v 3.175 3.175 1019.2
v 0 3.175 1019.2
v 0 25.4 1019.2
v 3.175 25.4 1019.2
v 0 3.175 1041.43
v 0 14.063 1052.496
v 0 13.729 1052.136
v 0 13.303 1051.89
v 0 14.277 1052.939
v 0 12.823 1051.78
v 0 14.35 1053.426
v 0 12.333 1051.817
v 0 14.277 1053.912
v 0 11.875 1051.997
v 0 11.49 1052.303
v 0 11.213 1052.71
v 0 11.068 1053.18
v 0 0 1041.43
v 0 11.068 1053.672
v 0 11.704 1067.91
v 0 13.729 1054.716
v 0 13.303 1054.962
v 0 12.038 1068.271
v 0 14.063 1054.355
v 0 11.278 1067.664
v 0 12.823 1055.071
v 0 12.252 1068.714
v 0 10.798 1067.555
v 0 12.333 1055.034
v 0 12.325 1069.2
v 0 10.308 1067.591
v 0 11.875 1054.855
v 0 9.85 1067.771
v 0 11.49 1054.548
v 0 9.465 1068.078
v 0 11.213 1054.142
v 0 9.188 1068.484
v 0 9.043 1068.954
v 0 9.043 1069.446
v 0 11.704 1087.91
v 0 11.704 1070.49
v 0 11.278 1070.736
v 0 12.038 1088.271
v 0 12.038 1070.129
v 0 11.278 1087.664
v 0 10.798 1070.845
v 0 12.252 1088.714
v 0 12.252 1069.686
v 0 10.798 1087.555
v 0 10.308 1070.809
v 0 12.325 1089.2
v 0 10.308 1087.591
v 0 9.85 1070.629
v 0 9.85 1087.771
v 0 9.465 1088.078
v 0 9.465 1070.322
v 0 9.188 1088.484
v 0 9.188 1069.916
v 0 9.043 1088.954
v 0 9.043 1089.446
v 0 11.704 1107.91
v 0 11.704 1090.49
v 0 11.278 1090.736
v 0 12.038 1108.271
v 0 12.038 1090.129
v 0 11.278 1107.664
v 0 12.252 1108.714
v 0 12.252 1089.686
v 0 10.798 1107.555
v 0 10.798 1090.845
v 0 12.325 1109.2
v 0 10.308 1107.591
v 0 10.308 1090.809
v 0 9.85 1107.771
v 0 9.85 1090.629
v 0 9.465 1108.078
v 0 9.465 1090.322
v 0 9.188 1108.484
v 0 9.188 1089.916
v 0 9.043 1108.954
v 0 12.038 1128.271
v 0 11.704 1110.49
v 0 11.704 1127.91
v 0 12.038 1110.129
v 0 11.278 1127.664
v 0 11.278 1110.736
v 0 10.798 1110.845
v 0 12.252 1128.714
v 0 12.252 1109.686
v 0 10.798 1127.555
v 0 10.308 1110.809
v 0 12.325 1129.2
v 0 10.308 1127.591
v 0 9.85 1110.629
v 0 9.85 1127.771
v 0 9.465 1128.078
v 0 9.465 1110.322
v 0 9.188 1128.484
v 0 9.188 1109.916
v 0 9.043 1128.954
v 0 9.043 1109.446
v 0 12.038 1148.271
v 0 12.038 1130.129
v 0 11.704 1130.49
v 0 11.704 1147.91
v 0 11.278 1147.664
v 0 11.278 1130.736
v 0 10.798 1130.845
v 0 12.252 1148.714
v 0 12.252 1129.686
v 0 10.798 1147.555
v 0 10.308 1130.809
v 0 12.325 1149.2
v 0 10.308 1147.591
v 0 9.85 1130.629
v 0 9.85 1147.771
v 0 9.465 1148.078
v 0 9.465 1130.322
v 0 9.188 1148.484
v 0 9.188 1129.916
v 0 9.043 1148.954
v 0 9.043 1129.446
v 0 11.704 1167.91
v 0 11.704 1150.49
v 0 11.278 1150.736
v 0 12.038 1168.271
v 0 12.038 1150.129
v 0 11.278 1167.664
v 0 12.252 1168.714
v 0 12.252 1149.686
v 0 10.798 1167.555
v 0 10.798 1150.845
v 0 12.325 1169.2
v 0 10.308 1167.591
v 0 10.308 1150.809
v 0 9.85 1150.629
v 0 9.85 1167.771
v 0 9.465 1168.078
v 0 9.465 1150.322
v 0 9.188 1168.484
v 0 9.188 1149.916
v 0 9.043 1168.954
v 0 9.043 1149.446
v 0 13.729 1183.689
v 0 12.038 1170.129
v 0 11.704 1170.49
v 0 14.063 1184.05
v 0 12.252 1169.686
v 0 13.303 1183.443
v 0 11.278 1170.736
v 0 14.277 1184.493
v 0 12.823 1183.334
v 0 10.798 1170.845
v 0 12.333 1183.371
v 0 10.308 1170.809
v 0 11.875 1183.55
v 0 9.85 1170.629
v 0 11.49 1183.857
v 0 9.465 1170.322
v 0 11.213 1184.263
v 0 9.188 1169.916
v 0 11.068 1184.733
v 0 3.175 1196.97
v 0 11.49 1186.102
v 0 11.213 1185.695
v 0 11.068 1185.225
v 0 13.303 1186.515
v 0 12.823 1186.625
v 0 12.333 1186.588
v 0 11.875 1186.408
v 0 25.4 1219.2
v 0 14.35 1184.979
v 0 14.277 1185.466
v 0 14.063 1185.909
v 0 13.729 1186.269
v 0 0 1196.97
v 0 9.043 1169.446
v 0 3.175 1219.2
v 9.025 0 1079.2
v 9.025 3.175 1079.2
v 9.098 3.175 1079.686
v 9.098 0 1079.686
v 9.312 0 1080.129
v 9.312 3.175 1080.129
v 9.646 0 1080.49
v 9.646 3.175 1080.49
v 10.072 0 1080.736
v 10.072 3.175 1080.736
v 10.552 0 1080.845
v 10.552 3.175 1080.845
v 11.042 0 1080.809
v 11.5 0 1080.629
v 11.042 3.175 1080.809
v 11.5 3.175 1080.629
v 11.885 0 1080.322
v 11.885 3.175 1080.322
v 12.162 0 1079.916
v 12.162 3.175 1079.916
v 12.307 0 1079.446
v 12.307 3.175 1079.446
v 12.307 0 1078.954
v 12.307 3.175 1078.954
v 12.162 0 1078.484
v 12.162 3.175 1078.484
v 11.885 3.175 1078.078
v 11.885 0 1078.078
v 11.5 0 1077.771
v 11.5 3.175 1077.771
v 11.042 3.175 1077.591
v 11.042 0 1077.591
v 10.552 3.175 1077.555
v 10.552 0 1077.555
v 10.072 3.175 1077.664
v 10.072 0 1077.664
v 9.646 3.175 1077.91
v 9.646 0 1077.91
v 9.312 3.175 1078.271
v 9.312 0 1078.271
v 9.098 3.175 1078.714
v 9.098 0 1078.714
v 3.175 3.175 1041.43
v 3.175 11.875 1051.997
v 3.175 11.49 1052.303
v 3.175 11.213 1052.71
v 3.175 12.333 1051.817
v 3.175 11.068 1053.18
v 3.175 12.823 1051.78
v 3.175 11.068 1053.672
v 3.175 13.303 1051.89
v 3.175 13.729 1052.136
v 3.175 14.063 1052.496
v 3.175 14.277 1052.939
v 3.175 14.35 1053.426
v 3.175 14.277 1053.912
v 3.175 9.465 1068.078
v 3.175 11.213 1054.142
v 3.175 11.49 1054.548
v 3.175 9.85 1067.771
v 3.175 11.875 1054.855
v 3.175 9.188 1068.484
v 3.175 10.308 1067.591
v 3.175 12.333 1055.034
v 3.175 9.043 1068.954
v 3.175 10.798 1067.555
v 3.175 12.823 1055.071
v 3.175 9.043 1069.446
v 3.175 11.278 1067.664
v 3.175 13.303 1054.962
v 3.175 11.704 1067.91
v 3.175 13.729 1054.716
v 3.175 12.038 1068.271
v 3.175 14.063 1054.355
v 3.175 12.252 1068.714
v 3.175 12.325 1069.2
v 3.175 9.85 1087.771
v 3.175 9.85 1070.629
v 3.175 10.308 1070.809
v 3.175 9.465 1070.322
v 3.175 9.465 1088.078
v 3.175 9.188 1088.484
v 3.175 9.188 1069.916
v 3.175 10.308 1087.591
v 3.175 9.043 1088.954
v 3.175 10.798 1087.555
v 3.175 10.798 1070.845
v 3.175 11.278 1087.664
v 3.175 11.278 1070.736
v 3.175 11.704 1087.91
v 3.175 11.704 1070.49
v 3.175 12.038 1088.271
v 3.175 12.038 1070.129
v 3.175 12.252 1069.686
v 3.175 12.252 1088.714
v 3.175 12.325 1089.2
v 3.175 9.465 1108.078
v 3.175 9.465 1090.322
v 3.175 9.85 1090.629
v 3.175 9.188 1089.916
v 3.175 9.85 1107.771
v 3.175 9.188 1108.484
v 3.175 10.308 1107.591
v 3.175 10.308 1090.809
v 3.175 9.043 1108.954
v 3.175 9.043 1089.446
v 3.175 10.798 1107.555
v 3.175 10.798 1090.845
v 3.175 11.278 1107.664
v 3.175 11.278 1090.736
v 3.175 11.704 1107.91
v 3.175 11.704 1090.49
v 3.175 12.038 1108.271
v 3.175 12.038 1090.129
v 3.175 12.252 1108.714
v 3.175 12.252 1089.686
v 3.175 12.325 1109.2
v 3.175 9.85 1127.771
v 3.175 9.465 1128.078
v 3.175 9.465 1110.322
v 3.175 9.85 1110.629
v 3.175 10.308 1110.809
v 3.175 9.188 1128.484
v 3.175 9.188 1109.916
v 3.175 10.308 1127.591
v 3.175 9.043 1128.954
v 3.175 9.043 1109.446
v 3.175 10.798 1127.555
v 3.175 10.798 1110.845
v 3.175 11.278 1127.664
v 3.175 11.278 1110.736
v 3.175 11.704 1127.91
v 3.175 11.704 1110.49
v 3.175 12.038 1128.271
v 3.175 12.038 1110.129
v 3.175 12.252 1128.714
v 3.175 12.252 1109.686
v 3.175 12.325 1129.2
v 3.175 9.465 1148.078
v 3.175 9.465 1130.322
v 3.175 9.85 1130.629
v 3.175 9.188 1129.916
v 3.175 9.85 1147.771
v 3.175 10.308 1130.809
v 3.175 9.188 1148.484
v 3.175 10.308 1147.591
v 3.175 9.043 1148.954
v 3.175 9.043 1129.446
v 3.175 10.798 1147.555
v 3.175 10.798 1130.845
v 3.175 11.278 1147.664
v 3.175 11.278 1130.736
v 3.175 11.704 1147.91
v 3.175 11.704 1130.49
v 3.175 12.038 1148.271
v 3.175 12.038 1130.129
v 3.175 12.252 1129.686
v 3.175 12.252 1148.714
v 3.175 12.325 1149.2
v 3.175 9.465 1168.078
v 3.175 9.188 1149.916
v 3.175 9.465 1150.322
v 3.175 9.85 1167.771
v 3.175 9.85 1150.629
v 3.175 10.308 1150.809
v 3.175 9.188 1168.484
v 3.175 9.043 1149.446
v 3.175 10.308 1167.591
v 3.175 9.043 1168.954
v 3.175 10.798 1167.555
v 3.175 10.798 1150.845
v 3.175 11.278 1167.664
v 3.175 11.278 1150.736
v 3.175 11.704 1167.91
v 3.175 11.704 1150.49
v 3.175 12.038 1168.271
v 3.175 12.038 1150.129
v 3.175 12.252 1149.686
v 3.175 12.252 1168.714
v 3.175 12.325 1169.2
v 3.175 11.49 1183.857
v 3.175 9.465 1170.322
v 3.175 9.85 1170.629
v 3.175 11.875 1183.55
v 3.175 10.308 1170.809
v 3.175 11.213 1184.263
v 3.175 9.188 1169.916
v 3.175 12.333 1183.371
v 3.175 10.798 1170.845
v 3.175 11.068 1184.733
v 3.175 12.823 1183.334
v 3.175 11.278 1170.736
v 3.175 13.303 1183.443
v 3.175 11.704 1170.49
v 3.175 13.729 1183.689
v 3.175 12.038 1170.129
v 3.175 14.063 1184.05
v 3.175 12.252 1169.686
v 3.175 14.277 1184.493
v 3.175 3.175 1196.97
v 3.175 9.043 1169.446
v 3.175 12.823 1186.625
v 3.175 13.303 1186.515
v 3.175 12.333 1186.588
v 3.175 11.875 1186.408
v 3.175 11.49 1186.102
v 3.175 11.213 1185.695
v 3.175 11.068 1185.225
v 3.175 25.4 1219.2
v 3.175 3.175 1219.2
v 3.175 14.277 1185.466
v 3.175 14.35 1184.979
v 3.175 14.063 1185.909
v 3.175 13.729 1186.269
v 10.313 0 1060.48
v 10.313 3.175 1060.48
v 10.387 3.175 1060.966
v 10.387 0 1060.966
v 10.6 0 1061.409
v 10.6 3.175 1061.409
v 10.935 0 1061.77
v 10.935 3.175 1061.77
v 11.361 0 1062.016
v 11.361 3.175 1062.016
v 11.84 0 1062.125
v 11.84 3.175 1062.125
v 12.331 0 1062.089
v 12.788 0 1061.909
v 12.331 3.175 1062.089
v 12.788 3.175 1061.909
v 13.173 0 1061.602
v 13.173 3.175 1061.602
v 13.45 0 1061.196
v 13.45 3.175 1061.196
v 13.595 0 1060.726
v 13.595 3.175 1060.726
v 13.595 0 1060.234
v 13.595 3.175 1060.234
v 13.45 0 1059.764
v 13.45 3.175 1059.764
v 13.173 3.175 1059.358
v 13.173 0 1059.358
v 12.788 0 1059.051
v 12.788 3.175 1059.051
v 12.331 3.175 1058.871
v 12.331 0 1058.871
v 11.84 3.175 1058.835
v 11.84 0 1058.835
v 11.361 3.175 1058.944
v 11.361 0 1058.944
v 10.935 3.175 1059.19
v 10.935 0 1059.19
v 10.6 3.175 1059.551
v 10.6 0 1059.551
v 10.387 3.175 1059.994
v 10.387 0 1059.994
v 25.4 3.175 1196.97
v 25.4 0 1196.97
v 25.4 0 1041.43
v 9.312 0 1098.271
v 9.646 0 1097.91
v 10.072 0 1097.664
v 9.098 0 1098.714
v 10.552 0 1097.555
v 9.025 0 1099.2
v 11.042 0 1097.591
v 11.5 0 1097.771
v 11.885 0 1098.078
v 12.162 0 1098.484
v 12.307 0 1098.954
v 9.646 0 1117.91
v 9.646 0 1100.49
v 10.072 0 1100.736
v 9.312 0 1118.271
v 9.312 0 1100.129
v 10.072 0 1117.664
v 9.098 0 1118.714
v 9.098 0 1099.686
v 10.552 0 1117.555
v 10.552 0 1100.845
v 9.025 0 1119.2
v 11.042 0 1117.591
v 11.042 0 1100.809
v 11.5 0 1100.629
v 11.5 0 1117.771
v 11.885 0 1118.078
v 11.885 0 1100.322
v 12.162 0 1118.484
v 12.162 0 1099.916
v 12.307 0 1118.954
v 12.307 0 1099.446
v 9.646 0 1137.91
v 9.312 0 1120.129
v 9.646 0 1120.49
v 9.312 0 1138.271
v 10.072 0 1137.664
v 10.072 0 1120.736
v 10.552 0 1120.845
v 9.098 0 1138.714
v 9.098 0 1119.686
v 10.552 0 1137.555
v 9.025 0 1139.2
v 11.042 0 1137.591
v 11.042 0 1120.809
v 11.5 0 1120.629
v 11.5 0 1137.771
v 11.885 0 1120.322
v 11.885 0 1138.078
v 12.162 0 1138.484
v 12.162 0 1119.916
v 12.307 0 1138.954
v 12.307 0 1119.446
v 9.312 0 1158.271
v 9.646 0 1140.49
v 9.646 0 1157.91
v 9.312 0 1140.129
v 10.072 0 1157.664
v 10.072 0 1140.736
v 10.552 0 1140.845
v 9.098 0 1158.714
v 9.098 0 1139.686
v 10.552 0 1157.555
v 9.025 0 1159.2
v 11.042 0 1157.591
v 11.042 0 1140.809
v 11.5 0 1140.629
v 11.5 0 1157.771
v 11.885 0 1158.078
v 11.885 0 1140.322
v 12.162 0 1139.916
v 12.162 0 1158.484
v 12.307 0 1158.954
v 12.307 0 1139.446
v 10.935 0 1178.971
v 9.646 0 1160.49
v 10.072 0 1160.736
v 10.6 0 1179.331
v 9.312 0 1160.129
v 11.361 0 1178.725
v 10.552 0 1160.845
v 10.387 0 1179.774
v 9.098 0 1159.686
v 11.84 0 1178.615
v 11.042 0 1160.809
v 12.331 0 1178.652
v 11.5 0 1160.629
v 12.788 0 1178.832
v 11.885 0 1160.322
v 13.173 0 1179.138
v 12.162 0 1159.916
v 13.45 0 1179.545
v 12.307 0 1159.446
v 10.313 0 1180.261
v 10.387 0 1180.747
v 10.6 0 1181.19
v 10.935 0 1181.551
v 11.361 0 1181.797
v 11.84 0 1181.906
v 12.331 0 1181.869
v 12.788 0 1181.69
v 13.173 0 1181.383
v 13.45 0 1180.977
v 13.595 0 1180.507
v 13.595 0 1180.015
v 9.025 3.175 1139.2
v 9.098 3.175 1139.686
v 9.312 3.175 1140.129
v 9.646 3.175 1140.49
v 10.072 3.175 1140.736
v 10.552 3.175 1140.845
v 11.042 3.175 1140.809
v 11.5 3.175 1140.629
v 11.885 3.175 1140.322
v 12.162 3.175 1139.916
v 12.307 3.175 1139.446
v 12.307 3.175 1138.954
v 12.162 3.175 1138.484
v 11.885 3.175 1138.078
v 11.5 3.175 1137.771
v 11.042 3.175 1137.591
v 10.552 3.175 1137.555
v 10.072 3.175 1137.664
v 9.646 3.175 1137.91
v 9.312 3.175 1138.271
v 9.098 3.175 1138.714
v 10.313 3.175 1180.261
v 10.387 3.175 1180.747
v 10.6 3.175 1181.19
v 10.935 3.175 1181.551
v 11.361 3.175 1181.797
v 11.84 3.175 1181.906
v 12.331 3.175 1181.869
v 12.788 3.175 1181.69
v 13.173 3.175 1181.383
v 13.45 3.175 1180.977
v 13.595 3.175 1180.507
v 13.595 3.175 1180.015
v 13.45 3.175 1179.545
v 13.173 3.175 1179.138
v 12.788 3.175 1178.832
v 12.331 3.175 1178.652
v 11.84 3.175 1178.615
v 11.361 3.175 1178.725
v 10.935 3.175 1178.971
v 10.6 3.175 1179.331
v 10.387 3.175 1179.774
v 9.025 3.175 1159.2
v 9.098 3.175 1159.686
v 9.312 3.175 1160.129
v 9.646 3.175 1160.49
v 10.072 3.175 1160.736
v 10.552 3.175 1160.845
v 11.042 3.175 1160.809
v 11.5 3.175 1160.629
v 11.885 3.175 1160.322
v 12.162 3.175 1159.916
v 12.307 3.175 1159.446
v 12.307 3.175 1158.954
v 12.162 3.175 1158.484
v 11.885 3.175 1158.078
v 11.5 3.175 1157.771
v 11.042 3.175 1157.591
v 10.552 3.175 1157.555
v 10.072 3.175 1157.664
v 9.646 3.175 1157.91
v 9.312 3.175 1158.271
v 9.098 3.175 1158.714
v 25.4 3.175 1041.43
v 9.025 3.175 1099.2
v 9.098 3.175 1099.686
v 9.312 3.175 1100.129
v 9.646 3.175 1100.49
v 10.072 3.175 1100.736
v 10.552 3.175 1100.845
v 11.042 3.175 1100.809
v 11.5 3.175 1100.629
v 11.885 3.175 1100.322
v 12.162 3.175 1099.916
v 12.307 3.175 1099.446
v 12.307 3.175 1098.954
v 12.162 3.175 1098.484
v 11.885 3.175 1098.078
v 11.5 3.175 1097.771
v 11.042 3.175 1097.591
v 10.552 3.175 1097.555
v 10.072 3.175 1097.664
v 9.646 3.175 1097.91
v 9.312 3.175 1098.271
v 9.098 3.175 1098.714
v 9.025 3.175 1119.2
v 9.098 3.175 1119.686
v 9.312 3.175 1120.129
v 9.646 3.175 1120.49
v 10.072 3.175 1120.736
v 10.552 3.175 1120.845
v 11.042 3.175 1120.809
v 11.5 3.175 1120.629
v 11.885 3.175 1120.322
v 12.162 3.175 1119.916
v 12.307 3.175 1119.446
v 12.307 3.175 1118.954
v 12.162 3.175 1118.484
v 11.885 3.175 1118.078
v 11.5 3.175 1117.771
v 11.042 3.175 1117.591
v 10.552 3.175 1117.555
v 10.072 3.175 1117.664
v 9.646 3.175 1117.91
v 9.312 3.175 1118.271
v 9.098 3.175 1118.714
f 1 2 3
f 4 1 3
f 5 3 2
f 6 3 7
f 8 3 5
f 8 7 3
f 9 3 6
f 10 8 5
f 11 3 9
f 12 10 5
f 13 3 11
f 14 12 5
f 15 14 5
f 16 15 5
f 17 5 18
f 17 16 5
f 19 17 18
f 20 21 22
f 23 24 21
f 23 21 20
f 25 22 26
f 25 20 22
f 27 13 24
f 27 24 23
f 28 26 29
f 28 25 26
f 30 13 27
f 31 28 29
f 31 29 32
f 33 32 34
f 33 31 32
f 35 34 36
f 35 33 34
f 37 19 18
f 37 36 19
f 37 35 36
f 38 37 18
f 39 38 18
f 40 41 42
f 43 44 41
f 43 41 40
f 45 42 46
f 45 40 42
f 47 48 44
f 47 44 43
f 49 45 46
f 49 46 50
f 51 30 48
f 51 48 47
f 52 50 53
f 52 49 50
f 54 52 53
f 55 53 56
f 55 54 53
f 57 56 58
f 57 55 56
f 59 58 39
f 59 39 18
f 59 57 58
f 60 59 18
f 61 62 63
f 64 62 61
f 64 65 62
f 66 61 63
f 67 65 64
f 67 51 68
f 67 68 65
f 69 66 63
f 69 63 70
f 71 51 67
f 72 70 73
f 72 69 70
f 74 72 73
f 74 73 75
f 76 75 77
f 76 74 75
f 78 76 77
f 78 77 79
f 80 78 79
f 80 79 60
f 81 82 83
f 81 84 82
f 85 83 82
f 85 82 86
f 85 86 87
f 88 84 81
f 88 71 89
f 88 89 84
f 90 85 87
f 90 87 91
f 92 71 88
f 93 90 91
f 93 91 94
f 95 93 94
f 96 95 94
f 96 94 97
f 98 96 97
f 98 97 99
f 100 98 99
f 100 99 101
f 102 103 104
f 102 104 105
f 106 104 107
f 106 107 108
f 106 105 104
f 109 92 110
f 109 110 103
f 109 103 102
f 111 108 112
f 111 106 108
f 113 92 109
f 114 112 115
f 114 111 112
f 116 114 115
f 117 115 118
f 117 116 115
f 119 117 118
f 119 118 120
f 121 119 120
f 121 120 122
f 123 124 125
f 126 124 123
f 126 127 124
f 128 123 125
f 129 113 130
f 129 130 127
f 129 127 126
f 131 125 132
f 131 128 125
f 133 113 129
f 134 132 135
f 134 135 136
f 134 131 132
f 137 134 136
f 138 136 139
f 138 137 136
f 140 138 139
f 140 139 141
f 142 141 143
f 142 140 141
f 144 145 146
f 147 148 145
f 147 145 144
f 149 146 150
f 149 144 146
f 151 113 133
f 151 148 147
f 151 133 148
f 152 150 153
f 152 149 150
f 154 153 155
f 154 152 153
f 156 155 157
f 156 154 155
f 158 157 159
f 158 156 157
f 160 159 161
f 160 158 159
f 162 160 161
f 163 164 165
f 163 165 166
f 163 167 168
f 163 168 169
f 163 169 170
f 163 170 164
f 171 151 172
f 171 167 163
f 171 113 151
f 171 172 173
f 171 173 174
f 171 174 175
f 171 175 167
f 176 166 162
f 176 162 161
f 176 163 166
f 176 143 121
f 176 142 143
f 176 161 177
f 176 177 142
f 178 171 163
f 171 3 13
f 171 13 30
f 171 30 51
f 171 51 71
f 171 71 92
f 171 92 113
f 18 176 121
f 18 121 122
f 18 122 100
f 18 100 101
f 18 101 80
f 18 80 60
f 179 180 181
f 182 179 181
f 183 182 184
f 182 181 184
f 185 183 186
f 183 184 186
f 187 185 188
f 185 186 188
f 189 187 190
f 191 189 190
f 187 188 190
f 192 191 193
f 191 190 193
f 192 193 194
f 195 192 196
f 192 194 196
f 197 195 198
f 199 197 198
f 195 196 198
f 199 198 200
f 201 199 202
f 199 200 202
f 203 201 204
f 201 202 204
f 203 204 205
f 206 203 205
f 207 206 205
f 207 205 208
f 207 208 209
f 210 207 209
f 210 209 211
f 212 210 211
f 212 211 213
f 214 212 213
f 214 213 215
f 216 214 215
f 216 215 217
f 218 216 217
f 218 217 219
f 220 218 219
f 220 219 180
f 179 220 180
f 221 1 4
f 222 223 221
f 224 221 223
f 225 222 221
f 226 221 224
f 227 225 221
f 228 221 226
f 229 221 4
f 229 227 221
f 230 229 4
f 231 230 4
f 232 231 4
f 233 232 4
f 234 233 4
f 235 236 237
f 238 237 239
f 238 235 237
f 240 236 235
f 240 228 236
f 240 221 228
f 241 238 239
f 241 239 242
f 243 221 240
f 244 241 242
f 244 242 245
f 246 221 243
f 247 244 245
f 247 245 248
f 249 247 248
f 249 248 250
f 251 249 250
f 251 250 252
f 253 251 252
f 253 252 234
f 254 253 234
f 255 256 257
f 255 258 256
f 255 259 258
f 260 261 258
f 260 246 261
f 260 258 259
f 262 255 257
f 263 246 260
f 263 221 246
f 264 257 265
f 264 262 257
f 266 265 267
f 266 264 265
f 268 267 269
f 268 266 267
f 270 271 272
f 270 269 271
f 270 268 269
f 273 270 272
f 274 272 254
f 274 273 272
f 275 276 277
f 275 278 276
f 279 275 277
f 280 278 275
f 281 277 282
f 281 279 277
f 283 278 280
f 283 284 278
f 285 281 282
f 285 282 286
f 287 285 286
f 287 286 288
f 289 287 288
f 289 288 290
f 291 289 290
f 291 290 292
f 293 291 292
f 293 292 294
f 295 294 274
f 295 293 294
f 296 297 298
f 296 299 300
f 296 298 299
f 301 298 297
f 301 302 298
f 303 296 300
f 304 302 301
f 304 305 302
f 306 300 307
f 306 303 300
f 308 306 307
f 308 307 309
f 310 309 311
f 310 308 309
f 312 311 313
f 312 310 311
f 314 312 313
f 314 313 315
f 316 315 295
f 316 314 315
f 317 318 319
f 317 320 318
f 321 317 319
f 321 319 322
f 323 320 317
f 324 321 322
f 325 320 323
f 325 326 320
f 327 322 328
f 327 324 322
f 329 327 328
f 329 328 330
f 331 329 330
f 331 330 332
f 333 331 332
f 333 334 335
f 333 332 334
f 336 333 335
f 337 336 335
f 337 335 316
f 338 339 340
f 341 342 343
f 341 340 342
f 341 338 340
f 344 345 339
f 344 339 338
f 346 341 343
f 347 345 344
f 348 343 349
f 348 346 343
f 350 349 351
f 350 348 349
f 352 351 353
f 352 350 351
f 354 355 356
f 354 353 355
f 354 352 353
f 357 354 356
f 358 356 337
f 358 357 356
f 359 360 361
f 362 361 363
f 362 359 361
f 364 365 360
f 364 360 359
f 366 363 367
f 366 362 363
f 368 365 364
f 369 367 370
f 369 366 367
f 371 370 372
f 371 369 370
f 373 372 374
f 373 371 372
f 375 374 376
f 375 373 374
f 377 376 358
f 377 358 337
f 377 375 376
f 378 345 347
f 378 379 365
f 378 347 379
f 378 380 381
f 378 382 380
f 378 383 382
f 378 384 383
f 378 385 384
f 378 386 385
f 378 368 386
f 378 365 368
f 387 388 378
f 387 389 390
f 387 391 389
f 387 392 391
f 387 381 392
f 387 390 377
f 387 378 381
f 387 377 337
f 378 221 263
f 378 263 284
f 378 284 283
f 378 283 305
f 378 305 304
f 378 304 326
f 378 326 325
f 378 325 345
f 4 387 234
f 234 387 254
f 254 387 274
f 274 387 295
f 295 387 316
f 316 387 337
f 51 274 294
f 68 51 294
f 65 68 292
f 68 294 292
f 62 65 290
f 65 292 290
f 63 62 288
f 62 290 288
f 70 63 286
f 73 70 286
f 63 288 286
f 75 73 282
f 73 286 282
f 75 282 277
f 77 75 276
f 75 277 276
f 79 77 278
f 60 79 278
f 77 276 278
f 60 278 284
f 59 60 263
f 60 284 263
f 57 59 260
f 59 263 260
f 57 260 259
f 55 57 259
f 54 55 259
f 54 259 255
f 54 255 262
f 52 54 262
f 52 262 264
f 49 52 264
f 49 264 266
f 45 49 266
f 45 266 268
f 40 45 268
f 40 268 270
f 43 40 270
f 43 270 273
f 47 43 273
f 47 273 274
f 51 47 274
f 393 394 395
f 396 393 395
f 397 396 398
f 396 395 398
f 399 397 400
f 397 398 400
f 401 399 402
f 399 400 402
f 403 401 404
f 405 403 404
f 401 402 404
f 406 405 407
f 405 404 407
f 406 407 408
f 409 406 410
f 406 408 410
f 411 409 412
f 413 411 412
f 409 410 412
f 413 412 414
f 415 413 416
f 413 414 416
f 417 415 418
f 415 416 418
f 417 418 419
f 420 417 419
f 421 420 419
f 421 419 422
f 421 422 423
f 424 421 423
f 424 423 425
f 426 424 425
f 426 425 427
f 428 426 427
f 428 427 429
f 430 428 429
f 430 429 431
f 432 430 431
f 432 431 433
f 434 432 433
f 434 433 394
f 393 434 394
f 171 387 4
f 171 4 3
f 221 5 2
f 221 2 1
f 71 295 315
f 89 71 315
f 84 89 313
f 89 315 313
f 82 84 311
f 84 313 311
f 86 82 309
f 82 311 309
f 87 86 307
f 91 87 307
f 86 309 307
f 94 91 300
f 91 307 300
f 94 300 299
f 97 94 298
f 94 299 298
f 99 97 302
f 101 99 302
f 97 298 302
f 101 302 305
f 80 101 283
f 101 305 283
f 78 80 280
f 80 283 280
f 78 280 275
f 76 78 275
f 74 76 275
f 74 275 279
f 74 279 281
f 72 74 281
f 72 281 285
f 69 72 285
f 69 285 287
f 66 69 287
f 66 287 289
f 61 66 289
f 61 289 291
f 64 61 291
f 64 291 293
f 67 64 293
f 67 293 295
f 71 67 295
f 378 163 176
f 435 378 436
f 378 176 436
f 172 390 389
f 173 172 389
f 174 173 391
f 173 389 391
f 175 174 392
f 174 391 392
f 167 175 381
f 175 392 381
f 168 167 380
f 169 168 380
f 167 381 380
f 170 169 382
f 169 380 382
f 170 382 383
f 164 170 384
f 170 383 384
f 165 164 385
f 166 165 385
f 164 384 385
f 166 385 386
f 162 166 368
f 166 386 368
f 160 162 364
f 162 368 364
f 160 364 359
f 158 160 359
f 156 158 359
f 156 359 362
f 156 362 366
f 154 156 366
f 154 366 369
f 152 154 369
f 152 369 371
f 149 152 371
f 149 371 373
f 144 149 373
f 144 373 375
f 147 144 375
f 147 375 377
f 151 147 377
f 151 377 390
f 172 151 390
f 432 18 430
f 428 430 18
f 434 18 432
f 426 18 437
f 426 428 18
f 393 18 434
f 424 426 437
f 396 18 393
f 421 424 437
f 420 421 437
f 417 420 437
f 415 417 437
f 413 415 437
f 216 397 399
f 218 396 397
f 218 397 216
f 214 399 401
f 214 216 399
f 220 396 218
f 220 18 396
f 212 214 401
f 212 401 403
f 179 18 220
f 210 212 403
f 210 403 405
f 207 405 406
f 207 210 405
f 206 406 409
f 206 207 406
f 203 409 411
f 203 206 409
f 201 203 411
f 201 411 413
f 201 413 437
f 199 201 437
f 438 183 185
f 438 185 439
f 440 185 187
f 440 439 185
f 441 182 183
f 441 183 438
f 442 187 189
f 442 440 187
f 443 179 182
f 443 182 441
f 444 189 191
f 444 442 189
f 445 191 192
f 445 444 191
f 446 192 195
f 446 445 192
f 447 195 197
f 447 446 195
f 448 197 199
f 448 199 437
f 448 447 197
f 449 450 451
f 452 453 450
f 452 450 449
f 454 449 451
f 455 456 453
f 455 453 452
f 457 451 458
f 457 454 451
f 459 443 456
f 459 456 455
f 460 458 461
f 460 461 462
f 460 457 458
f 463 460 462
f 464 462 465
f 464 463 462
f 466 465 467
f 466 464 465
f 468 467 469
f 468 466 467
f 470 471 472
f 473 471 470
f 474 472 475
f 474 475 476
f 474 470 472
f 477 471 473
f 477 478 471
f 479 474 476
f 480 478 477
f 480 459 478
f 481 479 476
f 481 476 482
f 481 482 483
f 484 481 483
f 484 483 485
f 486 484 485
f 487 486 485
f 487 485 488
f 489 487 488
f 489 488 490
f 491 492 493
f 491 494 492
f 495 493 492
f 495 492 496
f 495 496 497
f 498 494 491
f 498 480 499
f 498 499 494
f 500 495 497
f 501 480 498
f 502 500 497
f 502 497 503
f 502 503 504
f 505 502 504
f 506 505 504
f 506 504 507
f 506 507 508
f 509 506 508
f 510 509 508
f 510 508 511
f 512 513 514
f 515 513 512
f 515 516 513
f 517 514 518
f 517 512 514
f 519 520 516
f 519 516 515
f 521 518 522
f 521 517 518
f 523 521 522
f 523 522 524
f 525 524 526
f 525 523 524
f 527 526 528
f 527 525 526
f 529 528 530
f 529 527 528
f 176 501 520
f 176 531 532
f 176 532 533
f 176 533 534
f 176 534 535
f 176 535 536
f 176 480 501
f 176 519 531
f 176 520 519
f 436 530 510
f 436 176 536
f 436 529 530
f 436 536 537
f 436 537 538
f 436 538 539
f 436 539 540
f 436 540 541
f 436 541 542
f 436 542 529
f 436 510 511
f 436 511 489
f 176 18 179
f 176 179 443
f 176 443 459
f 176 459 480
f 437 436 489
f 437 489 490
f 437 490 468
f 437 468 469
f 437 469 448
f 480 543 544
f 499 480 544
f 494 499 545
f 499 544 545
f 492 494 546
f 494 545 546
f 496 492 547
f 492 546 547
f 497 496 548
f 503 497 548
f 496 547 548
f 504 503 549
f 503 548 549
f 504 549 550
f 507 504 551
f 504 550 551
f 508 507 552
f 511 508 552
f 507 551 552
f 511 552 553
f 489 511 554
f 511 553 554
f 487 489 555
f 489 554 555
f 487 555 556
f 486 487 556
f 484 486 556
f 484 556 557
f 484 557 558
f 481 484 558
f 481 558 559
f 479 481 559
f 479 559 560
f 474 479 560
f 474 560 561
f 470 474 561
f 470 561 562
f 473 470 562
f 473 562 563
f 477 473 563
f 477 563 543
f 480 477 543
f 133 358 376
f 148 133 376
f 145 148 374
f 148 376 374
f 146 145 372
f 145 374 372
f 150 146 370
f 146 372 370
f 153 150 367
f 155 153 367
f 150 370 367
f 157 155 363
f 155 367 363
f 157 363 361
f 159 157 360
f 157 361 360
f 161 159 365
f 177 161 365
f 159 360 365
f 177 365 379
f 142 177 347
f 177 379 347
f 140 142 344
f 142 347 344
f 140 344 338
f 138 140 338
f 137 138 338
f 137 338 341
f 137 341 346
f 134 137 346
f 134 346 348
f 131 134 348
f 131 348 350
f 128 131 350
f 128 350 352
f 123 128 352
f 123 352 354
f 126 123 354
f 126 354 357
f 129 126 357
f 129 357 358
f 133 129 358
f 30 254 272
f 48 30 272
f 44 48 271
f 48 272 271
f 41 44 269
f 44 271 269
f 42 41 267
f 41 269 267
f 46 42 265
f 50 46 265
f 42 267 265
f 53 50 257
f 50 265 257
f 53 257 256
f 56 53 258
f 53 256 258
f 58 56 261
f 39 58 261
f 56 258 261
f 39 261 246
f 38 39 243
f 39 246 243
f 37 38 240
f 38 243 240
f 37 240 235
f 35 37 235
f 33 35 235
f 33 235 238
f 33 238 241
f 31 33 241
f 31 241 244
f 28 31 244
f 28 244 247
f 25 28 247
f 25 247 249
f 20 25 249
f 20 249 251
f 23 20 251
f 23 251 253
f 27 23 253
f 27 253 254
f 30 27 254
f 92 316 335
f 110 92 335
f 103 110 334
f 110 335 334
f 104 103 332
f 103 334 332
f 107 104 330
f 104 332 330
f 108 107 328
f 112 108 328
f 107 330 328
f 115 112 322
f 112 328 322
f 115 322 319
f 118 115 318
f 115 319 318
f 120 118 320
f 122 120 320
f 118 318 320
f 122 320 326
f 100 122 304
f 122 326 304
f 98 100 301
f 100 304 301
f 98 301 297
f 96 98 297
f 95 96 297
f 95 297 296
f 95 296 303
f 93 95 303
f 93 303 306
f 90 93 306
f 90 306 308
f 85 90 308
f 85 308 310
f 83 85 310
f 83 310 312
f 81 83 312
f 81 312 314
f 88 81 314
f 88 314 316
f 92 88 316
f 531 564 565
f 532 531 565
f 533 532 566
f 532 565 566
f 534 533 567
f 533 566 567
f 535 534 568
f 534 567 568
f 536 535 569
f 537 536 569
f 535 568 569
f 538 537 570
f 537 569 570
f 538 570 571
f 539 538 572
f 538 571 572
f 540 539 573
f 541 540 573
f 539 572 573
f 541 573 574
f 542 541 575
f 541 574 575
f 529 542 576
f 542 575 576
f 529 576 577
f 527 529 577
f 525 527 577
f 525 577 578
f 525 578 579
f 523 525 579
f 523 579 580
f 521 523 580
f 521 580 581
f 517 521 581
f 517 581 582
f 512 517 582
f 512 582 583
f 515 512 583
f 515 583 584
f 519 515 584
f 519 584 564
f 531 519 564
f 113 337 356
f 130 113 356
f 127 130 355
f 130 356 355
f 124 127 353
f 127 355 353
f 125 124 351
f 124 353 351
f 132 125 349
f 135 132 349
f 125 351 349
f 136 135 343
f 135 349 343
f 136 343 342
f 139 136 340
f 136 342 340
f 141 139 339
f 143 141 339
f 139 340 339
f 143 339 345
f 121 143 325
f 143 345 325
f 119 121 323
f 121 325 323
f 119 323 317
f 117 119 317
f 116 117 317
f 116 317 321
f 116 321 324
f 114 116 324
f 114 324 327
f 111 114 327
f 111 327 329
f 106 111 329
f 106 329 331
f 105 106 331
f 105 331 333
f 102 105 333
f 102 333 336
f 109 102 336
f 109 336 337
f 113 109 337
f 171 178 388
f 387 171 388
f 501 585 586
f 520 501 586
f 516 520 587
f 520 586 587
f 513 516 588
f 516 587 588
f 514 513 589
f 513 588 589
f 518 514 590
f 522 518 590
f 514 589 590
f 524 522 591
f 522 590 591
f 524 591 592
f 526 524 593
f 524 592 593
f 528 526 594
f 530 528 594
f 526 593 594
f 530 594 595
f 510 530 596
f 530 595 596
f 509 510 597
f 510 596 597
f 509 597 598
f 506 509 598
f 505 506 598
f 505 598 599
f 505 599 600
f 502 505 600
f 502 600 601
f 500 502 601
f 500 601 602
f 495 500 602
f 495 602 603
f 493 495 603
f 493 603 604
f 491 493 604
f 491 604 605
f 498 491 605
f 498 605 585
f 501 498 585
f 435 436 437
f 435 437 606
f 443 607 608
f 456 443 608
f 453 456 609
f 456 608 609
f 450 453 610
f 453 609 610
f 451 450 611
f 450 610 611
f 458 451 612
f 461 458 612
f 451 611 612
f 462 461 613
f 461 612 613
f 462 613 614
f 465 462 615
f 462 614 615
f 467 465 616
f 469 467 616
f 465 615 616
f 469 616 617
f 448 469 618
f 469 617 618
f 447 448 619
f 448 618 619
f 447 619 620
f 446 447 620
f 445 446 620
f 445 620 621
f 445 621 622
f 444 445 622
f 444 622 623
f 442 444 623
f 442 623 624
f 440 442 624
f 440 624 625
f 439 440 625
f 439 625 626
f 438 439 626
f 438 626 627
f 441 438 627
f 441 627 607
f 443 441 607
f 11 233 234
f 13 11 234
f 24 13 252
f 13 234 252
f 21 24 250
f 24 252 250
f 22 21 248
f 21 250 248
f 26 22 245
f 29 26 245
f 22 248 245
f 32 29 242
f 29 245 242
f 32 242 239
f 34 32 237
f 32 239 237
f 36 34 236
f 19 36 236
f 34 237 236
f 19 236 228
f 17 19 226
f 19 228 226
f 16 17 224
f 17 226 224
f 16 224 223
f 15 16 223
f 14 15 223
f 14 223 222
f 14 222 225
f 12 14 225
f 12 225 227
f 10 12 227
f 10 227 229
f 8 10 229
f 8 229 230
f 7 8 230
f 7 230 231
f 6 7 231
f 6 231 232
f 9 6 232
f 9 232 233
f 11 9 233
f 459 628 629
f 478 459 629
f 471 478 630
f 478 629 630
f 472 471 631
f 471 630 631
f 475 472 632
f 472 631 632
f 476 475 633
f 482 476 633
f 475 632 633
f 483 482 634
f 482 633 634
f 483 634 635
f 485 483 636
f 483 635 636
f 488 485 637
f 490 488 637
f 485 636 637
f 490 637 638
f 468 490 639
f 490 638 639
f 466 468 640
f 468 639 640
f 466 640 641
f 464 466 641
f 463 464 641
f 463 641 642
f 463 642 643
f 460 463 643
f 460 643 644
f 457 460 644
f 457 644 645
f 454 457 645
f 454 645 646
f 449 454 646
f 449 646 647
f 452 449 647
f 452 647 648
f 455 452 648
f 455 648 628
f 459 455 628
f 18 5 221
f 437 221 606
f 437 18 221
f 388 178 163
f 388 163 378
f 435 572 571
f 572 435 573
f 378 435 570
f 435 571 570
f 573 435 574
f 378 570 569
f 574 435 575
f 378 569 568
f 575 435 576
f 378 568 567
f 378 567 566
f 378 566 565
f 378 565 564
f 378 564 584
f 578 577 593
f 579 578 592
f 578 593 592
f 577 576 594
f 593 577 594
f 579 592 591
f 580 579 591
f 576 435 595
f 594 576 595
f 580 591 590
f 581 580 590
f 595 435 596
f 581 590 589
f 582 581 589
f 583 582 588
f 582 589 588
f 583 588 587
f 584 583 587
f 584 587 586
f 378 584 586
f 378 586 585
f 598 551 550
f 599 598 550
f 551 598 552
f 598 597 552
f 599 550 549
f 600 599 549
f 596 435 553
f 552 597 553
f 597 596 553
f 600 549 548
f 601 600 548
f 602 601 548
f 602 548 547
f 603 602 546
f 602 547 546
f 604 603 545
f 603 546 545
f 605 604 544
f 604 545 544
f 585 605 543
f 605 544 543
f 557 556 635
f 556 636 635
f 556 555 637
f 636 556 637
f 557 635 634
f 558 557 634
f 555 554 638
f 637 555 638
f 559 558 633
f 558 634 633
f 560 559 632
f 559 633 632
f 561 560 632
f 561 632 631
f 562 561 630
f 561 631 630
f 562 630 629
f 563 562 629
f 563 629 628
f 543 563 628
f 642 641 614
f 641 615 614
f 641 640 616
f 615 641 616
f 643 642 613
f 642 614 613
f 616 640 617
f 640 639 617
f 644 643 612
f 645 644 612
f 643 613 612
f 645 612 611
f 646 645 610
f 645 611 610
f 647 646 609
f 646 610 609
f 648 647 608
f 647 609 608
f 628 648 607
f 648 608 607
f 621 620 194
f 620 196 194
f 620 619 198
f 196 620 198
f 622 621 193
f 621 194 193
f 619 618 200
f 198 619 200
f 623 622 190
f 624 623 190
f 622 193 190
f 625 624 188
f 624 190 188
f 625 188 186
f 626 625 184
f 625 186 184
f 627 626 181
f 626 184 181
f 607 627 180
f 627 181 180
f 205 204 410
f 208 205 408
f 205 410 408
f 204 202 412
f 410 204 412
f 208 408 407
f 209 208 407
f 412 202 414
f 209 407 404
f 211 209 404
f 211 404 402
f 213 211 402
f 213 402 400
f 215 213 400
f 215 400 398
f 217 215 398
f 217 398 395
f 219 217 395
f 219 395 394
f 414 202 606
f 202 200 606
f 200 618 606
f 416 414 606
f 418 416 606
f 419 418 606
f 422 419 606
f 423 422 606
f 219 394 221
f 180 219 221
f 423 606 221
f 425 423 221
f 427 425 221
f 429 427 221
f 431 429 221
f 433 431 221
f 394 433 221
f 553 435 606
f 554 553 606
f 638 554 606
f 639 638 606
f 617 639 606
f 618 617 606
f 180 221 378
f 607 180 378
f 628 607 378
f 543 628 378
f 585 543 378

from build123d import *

# Parameters (mm, degrees)
BOSS_EXTRUDE1_DEPTH = 1219.2
FILLET1_R           = 0.4064
SKETCH4_W           = 2238.4
SKETCH4_H           = 103.278519729
CUT_EXTRUDE1_DEPTH  = 60
SKETCH5_W           = 25.4
SKETCH5_H           = 22.23
CUT_EXTRUDE2_DEPTH  = 3.175
SKETCH6_W           = 25.4
SKETCH6_H           = 22.23
CUT_EXTRUDE3_DEPTH  = 3.175
SKETCH7_W           = 1.26890891
SKETCH7_H           = 1.024965533
CUT_EXTRUDE4_DEPTH  = 220
SKETCH9_R           = 1.65
CUT_EXTRUDE5_DEPTH  = 20
SKETCH10_R          = 1.65
CUT_EXTRUDE6_DEPTH  = 20
SKETCH11_R          = 1.65
CUT_EXTRUDE7_DEPTH  = 70
SKETCH12_R          = 1.65
CUT_EXTRUDE8_DEPTH  = 70


with BuildPart() as part:
    # Sketch3 → Boss-Extrude1 (new, symmetric)
    with BuildSketch(Plane.XY):
        Polygon((3.175, 25.4), (0, 25.4), (0, 0), (25.4, 0), (25.4, 3.175), (3.175, 3.175), align=None)
    extrude(amount=BOSS_EXTRUDE1_DEPTH, both=True)

    # Fillet1
    fillet1_edges = [part.edges().sort_by_distance(p)[0] for p in [
        (3.175, 3.175, 0),
    ]]
    fillet(fillet1_edges, radius=FILLET1_R)

    # Sketch4 → Cut-Extrude1 (cut)
    with BuildSketch(Plane.ZY):
        with Locations((-100, -26.239259864)):
            Rectangle(SKETCH4_W, SKETCH4_H)
    extrude(amount=-CUT_EXTRUDE1_DEPTH, mode=Mode.SUBTRACT)

    # Sketch5 → Cut-Extrude2 (cut)
    with BuildSketch(Plane.XZ):
        with Locations((12.7, 1030.315)):
            Rectangle(SKETCH5_W, SKETCH5_H)
    extrude(amount=-CUT_EXTRUDE2_DEPTH, mode=Mode.SUBTRACT)

    # Sketch6 → Cut-Extrude3 (cut)
    with BuildSketch(Plane.XZ):
        with Locations((12.7, 1208.085)):
            Rectangle(SKETCH6_W, SKETCH6_H)
    extrude(amount=-CUT_EXTRUDE3_DEPTH, mode=Mode.SUBTRACT)

    # Sketch7 → Cut-Extrude4 (cut)
    with BuildSketch(Plane(origin=(0, 0, 1019.2), x_dir=(-1, 0, 0), z_dir=(0, 0, -1))):
        with Locations((-3.809454455, 3.687482767)):
            Rectangle(SKETCH7_W, SKETCH7_H)
    extrude(amount=-CUT_EXTRUDE4_DEPTH, mode=Mode.SUBTRACT)

    # Sketch9 → Cut-Extrude5 (cut)
    with BuildSketch(Plane(origin=(3.175, 0, 0), x_dir=(0, 0, -1), z_dir=(1, 0, 0))):
        with Locations(Location((-1169.2, 10.675, 0), (0, 0, 90))):
            Circle(SKETCH9_R)
        with Locations(Location((-1149.2, 10.675, 0), (0, 0, 90))):
            Circle(SKETCH9_R)
        with Locations(Location((-1129.2, 10.675, 0), (0, 0, 90))):
            Circle(SKETCH9_R)
        with Locations(Location((-1109.2, 10.675, 0), (0, 0, 90))):
            Circle(SKETCH9_R)
        with Locations(Location((-1089.2, 10.675, 0), (0, 0, 90))):
            Circle(SKETCH9_R)
        with Locations(Location((-1069.2, 10.675, 0), (0, 0, 90))):
            Circle(SKETCH9_R)
    extrude(amount=-CUT_EXTRUDE5_DEPTH, mode=Mode.SUBTRACT)

    # Sketch10 → Cut-Extrude6 (cut)
    with BuildSketch(Plane(origin=(0, 3.175, 0), x_dir=(1, 0, 0), z_dir=(0, 1, 0))):
        with Locations(Location((10.675, -1079.2, 0), (0, 0, 180))):
            Circle(SKETCH10_R)
        with Locations(Location((10.675, -1099.2, 0), (0, 0, 180))):
            Circle(SKETCH10_R)
        with Locations(Location((10.675, -1119.2, 0), (0, 0, 180))):
            Circle(SKETCH10_R)
        with Locations(Location((10.675, -1139.2, 0), (0, 0, 180))):
            Circle(SKETCH10_R)
        with Locations(Location((10.675, -1159.2, 0), (0, 0, 180))):
            Circle(SKETCH10_R)
    extrude(amount=-CUT_EXTRUDE6_DEPTH, mode=Mode.SUBTRACT)

    # Sketch11 → Cut-Extrude7 (cut)
    with BuildSketch(Plane(origin=(3.175, 0, 0), x_dir=(0, 0, -1), z_dir=(1, 0, 0))):
        with Locations(Location((-1053.425704333, 12.7, 0), (0, 0, 90))):
            Circle(SKETCH11_R)
        with Locations(Location((-1184.979295667, 12.7, 0), (0, 0, 90))):
            Circle(SKETCH11_R)
    extrude(amount=-CUT_EXTRUDE7_DEPTH, mode=Mode.SUBTRACT)

    # Sketch12 → Cut-Extrude8 (cut)
    with BuildSketch(Plane(origin=(0, 3.175, 0), x_dir=(1, 0, 0), z_dir=(0, 1, 0))):
        with Locations(Location((11.9634, -1180.260622857, 0), (0, 0, 180))):
            Circle(SKETCH12_R)
        with Locations(Location((11.9634, -1060.48, 0), (0, 0, 180))):
            Circle(SKETCH12_R)
    extrude(amount=-CUT_EXTRUDE8_DEPTH, mode=Mode.SUBTRACT)


solid = part.part
